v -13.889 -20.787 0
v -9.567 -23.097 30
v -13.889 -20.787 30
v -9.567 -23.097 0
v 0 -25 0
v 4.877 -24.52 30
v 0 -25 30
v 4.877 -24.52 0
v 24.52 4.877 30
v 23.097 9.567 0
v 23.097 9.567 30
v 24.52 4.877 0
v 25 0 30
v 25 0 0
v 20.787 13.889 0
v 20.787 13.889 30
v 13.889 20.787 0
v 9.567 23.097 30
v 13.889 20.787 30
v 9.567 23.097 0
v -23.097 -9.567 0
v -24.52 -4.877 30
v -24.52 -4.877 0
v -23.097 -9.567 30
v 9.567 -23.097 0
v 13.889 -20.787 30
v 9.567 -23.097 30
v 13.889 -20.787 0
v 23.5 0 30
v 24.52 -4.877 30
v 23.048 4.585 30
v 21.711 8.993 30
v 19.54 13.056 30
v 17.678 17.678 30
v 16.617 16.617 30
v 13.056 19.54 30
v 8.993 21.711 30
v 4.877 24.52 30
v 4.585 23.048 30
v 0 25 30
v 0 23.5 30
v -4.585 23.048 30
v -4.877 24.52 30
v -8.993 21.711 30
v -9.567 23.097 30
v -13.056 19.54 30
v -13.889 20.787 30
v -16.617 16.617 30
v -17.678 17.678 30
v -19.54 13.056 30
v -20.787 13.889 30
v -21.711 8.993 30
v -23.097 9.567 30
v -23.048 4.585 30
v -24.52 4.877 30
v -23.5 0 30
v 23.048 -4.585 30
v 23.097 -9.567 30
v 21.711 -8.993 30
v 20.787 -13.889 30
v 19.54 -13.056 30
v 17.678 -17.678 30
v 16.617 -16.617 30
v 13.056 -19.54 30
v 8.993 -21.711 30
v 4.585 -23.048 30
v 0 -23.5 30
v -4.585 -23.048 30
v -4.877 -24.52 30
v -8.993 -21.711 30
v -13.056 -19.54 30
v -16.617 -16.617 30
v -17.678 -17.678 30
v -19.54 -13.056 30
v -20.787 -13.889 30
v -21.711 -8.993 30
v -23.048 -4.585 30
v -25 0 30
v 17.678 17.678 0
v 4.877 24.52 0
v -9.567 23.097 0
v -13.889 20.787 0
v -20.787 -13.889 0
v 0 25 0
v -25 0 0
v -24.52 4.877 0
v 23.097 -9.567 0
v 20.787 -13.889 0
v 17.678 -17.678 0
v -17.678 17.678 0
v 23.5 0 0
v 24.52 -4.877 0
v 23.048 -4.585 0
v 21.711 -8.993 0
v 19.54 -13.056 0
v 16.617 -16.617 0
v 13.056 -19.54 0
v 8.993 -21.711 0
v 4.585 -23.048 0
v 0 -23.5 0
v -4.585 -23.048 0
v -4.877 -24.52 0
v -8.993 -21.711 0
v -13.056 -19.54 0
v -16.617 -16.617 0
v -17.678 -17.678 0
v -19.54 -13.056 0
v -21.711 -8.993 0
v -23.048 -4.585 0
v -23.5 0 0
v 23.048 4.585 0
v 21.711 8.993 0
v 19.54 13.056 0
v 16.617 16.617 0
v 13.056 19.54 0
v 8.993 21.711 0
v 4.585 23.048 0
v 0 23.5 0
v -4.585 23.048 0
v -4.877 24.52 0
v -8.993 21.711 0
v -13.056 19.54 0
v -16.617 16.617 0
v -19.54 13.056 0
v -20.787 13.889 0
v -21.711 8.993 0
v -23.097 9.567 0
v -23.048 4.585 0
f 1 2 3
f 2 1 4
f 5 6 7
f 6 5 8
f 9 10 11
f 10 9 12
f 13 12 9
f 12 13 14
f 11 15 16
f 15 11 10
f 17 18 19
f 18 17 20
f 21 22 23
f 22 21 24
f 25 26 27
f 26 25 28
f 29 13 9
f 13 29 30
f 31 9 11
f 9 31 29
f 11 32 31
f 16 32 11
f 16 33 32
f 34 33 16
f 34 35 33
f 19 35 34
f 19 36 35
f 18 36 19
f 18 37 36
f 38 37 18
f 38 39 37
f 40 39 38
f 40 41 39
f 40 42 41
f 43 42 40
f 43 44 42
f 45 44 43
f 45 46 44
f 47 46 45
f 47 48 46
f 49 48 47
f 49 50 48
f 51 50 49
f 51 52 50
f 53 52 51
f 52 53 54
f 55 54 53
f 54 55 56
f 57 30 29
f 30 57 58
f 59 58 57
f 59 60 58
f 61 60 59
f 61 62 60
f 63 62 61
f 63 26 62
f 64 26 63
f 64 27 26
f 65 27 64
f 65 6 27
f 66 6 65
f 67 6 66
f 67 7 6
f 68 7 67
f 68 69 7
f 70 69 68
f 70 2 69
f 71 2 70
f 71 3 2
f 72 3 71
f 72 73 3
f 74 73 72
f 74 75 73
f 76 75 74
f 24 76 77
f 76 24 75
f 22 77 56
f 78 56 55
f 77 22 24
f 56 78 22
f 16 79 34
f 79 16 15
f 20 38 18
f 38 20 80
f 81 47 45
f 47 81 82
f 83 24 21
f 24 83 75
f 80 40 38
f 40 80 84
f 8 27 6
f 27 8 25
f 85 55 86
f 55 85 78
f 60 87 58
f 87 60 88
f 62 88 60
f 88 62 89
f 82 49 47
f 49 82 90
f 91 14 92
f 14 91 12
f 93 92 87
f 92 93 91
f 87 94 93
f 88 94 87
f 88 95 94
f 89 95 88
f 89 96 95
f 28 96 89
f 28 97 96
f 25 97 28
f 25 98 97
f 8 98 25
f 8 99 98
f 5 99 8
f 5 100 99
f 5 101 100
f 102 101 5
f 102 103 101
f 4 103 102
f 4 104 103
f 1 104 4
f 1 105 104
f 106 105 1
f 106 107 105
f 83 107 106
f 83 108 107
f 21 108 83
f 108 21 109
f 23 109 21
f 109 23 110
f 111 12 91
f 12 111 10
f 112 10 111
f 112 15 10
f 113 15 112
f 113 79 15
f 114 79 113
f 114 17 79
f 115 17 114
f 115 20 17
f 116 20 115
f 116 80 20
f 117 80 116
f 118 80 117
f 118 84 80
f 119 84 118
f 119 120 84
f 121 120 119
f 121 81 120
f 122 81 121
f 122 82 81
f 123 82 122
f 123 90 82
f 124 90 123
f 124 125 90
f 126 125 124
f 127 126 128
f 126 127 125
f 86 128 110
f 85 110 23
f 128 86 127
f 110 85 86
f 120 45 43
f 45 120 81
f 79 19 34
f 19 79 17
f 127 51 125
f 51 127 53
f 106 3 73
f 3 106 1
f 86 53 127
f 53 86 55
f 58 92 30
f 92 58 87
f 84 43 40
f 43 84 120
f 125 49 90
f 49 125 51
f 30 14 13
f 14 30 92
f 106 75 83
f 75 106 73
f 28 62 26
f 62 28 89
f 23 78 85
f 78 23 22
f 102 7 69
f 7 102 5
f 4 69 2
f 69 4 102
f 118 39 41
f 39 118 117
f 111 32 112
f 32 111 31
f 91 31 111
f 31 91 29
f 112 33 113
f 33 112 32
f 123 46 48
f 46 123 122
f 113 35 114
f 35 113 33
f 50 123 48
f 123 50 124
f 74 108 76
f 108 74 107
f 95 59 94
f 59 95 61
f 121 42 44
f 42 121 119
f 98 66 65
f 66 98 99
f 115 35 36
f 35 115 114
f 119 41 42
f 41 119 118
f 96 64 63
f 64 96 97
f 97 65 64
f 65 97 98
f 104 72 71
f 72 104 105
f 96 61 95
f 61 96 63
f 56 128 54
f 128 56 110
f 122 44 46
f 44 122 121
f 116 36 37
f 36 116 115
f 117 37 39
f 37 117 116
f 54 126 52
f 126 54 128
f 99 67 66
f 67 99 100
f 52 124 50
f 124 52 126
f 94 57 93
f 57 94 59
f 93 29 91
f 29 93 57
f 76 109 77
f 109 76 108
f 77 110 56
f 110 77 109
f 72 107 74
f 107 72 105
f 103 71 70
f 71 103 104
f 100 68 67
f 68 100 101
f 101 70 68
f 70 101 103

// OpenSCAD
$fn = 32;

// ----------------------------------------------------------------------
// Thin tube: 1.5 mm wall
// ----------------------------------------------------------------------

// --- parameters (mm) ---
tube_od = 50;             // outer diameter
tube_h = 30;              // height, Z
wall = 1.5;               // wall thickness

difference() {
  cylinder(h = tube_h, d = tube_od);
  translate([0, 0, -1]) cylinder(h = tube_h + 2, d = tube_od - 2 * wall);
}
